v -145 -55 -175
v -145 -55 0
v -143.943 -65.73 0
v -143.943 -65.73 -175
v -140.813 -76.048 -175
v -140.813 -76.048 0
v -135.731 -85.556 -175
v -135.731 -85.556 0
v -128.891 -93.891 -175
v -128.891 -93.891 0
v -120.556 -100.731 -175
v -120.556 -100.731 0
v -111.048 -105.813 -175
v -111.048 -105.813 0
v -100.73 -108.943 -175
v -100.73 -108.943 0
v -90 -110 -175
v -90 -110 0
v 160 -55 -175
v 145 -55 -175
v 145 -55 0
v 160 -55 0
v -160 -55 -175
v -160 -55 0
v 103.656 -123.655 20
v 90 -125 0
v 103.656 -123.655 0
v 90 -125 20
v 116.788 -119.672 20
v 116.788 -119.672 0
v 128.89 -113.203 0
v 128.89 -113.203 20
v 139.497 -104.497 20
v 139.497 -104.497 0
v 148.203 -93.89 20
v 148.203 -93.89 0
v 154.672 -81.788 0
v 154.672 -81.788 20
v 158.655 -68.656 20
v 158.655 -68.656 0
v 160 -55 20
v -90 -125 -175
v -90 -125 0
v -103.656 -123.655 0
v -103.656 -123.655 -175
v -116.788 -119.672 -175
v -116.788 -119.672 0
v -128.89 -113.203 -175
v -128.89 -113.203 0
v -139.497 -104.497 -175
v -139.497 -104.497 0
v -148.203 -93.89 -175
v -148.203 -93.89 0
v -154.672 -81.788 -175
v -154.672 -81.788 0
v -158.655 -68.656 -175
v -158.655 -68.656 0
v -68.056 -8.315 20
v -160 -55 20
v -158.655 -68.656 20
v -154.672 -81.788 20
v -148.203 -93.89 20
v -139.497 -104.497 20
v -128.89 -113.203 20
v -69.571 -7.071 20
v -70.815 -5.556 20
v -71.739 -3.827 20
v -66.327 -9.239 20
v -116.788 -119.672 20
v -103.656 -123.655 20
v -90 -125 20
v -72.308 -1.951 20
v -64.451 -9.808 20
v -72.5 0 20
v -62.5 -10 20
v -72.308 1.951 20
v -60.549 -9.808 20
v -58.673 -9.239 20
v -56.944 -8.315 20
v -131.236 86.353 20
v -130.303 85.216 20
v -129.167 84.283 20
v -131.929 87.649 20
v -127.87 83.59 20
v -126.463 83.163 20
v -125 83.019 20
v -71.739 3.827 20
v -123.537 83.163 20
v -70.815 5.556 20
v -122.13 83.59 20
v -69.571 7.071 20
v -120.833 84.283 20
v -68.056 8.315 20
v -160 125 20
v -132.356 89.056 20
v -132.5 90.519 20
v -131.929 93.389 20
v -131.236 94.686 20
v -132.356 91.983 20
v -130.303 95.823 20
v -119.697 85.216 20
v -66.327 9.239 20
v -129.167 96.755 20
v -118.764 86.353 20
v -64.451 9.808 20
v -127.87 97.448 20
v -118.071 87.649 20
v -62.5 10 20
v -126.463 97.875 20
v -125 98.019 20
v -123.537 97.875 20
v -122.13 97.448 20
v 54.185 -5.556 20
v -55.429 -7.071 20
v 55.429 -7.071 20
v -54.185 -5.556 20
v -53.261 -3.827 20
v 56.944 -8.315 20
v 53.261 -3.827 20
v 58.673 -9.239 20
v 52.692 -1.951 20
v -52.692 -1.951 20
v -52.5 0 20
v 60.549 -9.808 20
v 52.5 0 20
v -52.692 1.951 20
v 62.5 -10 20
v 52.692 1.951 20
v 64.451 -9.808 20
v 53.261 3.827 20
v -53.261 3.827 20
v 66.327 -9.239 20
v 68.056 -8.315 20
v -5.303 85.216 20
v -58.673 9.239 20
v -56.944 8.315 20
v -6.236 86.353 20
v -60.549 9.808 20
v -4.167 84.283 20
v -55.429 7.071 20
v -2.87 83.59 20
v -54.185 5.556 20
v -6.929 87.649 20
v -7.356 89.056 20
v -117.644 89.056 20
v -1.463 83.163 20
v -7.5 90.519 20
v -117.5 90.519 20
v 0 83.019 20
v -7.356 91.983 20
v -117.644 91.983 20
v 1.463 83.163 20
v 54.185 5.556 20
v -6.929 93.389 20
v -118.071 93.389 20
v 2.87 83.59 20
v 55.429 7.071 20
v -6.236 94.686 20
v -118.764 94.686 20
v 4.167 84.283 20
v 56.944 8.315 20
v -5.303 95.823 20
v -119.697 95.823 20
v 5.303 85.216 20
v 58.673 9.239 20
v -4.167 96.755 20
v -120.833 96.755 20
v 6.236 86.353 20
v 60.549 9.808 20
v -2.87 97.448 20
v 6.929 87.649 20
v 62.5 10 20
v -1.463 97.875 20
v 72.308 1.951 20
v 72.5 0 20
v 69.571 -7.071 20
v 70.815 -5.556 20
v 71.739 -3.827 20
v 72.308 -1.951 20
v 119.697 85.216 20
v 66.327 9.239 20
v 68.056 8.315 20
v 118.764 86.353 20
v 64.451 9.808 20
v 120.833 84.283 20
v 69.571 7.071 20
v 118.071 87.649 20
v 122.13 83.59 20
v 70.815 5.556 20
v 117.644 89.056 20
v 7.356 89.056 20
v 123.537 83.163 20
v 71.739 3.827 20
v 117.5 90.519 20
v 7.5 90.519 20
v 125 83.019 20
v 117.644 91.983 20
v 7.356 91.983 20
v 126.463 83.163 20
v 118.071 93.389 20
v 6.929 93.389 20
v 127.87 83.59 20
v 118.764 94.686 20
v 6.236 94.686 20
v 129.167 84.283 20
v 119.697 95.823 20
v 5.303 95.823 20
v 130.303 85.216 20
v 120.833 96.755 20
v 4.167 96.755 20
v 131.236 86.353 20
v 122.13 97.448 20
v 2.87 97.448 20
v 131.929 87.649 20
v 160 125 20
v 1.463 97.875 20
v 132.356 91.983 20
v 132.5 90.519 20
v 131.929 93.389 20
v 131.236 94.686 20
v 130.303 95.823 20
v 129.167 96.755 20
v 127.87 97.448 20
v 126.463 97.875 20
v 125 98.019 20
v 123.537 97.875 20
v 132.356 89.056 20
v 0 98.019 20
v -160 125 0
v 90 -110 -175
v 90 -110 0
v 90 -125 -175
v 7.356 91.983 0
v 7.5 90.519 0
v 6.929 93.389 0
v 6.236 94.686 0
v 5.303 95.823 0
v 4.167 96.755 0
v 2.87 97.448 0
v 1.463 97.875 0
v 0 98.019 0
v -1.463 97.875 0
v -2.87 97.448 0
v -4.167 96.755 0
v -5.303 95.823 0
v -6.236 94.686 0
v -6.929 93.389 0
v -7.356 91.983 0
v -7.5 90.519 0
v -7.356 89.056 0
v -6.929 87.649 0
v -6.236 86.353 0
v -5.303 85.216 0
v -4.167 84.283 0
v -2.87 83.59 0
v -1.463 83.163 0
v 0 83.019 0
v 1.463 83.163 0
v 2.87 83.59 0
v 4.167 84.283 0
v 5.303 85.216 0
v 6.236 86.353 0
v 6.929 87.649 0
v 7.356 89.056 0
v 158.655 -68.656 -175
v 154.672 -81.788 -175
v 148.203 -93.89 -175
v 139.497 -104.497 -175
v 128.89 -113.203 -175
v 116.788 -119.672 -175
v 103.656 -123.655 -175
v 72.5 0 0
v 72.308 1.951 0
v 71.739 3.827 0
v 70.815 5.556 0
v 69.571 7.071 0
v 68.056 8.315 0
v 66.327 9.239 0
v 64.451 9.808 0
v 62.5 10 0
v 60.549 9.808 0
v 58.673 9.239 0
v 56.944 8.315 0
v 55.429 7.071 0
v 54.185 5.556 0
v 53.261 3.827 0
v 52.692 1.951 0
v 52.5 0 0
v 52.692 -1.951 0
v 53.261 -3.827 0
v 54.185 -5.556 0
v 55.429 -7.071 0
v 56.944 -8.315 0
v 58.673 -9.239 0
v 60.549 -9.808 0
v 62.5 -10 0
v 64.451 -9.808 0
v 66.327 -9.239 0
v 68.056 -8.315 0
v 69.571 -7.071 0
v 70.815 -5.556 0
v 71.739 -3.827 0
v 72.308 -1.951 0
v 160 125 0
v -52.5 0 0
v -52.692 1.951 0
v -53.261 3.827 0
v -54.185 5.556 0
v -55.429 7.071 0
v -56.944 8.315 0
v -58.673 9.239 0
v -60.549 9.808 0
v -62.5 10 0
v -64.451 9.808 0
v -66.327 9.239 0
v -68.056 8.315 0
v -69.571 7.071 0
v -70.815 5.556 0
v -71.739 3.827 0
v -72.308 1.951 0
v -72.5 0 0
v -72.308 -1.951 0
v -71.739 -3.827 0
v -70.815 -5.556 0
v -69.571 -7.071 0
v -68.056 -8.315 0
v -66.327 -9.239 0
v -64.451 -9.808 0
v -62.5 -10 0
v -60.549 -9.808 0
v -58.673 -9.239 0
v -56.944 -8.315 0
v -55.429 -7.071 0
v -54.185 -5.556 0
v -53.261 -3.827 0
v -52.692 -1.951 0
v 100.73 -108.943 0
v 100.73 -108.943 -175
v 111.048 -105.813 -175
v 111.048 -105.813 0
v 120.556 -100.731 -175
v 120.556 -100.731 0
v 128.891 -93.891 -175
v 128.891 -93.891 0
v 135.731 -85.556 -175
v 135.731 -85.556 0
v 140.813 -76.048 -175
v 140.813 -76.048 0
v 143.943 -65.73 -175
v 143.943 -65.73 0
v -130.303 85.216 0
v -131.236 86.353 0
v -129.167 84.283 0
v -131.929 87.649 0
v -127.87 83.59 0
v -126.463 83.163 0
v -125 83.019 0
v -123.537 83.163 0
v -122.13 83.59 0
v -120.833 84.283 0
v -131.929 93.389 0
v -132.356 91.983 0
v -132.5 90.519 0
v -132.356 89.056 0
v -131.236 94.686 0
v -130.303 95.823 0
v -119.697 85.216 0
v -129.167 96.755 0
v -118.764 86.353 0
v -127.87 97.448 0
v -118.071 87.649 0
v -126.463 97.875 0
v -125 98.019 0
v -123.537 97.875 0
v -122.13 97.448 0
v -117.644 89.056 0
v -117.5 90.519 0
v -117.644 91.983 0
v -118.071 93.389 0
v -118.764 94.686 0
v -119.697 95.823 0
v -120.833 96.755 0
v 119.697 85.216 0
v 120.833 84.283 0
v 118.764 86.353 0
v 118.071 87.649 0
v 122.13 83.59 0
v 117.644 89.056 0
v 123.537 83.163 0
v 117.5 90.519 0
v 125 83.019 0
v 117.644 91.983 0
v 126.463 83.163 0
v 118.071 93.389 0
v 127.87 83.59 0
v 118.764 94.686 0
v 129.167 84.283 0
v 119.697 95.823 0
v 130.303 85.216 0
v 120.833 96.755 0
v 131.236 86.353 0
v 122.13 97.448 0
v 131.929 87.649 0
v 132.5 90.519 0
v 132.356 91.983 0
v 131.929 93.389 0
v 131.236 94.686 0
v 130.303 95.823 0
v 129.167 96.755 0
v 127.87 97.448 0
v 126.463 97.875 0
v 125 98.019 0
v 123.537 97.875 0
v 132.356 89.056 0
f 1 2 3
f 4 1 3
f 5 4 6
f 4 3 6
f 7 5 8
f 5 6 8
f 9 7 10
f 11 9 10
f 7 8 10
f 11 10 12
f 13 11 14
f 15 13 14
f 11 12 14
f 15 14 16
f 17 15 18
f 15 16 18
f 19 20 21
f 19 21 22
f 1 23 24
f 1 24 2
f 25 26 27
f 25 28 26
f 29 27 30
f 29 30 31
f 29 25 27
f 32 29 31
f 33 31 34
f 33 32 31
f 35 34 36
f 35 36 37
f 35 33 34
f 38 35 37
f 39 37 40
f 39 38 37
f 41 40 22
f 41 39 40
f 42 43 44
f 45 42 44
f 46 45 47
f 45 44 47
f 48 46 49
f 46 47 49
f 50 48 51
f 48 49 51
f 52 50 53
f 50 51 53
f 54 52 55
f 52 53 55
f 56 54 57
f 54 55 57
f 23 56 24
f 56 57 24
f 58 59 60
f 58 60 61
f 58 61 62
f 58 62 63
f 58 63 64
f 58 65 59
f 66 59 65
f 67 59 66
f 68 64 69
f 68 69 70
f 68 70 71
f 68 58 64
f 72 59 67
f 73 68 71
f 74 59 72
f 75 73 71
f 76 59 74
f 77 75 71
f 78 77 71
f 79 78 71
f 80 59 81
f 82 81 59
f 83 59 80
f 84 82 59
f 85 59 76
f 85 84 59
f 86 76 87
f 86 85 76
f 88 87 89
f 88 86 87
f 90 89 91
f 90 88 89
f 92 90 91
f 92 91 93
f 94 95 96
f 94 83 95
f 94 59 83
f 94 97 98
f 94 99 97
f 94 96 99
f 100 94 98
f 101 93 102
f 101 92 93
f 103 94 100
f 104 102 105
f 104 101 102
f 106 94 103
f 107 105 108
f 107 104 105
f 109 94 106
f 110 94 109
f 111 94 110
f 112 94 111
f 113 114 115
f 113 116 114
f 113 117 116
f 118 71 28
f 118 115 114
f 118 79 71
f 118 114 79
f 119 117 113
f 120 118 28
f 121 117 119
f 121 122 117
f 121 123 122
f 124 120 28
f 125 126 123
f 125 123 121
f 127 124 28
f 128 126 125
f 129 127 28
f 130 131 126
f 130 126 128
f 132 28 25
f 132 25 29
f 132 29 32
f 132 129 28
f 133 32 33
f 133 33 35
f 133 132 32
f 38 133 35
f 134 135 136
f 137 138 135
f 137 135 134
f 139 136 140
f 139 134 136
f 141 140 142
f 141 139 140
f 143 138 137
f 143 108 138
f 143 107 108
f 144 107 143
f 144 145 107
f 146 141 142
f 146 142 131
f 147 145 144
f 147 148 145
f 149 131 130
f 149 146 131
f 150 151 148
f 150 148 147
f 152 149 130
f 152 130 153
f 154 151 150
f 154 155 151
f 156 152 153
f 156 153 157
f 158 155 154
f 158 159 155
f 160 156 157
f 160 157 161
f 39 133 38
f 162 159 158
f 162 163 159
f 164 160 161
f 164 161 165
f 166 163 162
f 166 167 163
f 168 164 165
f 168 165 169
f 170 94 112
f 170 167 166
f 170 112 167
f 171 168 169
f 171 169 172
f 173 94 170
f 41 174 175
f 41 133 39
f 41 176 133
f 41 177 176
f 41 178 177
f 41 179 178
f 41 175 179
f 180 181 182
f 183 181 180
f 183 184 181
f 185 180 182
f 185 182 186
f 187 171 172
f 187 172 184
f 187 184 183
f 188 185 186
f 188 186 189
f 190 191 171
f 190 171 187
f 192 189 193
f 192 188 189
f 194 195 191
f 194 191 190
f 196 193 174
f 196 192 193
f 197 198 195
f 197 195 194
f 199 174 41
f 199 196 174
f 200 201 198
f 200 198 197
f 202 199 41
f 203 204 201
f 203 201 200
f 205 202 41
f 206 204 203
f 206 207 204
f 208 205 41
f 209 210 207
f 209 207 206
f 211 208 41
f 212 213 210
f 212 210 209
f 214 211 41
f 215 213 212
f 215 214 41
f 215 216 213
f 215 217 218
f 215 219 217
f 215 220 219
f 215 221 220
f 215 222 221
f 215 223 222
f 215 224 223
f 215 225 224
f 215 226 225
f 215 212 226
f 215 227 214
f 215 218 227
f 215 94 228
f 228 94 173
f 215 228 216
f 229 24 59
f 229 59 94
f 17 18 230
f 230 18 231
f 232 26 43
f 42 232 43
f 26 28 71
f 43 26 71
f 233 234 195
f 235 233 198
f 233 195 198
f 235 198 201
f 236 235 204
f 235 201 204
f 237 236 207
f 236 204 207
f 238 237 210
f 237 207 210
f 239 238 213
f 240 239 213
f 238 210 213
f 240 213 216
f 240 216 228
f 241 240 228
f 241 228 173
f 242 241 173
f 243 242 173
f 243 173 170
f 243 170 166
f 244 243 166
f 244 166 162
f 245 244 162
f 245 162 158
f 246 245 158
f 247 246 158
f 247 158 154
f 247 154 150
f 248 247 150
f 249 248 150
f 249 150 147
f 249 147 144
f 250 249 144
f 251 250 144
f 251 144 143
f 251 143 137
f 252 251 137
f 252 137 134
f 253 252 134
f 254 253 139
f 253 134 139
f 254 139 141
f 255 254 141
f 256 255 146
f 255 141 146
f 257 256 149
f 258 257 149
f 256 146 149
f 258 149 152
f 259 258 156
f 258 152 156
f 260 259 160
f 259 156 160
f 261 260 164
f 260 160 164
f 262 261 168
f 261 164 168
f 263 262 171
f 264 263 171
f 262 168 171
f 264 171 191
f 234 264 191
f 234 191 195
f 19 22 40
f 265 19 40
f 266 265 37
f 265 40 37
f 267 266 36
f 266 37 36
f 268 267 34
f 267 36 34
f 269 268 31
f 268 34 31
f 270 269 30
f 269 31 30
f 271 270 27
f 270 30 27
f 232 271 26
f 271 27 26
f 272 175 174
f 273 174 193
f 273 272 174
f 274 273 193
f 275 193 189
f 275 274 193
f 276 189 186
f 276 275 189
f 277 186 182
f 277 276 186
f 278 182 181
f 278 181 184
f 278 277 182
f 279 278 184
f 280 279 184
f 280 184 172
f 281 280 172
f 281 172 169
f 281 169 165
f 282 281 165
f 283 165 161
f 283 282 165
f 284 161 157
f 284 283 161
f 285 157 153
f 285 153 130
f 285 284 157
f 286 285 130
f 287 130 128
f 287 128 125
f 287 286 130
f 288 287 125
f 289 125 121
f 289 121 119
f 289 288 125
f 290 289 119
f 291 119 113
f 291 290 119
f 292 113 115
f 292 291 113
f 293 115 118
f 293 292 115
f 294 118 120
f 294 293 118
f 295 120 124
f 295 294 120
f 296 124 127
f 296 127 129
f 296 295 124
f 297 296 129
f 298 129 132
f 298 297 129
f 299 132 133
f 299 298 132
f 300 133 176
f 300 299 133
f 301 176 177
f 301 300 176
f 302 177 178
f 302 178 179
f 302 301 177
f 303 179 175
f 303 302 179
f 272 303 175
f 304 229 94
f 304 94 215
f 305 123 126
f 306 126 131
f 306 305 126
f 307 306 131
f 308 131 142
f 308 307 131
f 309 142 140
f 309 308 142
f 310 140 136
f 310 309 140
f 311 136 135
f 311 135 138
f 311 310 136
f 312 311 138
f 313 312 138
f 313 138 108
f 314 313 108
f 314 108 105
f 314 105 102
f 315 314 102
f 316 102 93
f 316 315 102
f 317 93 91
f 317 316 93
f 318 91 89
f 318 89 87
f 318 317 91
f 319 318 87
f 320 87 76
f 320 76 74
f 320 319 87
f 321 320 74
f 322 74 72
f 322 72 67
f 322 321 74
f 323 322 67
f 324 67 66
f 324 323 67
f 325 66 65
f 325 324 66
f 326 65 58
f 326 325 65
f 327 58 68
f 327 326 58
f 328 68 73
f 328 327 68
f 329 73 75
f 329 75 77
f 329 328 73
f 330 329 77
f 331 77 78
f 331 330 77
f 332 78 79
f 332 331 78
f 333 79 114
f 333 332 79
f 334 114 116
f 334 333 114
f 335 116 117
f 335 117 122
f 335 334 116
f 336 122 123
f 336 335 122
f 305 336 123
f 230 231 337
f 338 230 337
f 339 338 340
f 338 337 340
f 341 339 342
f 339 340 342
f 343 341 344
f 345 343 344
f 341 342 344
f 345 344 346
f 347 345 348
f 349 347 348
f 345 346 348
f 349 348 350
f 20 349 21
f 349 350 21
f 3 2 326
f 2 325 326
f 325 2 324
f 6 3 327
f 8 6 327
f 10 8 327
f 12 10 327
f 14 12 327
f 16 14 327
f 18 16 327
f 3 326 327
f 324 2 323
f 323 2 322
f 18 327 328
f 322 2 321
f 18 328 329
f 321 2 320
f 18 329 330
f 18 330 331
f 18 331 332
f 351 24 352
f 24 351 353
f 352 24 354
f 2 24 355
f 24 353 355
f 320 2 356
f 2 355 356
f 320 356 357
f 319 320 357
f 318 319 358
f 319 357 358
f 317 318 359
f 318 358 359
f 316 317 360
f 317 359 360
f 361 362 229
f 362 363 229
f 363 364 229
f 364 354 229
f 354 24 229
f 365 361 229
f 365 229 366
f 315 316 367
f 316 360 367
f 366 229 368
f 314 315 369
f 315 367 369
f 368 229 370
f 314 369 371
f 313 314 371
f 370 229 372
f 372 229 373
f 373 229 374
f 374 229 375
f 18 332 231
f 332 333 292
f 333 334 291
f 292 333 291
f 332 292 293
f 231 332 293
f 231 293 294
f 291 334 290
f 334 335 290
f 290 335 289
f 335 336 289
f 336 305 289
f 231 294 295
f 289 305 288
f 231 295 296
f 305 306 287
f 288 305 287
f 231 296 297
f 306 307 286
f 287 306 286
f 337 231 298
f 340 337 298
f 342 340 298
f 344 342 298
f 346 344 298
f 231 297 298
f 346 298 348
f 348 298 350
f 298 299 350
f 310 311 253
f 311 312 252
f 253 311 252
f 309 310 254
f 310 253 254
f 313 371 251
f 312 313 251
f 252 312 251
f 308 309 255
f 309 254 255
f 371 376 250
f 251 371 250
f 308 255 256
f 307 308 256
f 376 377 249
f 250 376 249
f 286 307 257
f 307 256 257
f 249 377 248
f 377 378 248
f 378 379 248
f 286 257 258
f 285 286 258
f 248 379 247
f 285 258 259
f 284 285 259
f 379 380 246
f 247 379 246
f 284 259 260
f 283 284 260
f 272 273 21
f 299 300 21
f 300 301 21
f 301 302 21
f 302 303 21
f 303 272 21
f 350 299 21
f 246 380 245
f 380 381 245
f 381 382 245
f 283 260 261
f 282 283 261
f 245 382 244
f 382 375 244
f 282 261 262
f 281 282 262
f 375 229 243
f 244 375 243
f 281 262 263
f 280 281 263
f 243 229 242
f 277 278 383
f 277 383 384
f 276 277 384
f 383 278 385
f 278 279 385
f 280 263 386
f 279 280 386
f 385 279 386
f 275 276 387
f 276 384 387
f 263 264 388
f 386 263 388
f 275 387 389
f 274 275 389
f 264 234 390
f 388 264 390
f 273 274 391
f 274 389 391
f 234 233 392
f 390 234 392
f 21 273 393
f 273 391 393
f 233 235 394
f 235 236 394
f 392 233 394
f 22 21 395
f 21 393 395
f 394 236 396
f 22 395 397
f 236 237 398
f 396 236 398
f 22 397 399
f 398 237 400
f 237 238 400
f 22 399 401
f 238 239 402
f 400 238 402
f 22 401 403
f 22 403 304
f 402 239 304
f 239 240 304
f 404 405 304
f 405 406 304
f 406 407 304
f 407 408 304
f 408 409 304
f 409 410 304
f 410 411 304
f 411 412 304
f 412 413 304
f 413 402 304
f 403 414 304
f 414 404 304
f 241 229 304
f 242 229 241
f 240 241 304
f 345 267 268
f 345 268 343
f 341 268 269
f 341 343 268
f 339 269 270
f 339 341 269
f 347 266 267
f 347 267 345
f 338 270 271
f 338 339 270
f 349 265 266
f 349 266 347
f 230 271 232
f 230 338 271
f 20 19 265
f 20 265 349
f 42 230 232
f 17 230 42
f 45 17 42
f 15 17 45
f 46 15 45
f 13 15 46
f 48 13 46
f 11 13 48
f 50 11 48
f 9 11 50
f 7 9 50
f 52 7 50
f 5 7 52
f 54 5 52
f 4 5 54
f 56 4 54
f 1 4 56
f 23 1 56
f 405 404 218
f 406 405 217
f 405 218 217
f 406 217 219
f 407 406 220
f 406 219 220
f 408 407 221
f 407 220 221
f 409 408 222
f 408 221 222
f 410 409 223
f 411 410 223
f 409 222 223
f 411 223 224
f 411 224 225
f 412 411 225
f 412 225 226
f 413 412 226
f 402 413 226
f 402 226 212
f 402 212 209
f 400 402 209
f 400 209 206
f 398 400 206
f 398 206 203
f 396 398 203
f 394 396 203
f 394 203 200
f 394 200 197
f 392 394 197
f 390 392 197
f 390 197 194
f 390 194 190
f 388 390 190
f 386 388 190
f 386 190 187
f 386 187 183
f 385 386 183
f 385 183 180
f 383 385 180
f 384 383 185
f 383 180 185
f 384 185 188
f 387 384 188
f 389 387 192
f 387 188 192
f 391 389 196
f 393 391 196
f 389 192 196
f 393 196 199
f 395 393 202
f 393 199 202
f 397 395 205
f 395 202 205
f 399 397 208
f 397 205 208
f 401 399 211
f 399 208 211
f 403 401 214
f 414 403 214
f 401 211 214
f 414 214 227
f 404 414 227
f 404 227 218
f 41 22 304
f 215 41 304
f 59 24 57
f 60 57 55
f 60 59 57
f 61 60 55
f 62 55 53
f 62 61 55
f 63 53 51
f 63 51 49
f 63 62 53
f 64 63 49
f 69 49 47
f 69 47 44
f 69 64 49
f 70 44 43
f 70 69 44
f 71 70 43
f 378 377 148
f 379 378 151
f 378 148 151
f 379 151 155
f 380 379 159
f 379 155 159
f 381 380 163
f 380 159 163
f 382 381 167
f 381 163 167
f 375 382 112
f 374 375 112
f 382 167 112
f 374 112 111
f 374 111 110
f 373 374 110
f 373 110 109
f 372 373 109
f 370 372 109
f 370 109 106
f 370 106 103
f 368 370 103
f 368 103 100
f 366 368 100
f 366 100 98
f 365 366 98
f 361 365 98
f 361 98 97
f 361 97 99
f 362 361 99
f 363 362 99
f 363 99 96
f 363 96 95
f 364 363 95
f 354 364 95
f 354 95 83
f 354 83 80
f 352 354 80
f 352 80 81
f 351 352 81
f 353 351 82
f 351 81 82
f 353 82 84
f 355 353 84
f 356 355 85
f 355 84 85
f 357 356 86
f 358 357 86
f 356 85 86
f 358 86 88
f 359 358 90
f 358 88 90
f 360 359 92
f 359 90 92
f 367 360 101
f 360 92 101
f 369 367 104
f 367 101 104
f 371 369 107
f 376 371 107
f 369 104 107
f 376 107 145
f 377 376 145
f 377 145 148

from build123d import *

# Parameters (mm, degrees)
SKETCH1_W           = 320
SKETCH1_H           = 250
SKETCH1_R           = 10
BOSS_EXTRUDE1_DEPTH = 20
SKETCH2_R           = 7.5
CUT_EXTRUDE1_DEPTH  = 205.022057631
FILLET1_R           = 70
BOSS_EXTRUDE2_DEPTH = 175


# Read off the part's stored shape, not the designer's step: Boss-Extrude2
with BuildPart() as part:
    # Sketch1 → Boss-Extrude1 (new body)
    with BuildSketch(Plane.XY):
        Rectangle(SKETCH1_W, SKETCH1_H)
        with Locations((62.5, 0)):
            Circle(SKETCH1_R, mode=Mode.SUBTRACT)
        with Locations((-62.5, 0)):
            Circle(SKETCH1_R, mode=Mode.SUBTRACT)
    extrude(amount=BOSS_EXTRUDE1_DEPTH)

    # Sketch2 → Cut-Extrude1 (cut, through all)
    with BuildSketch(Plane.XY.offset(20)):
        with Locations((0, 90.519334951)):
            Circle(SKETCH2_R)
        with Locations((-125, 90.519334951)):
            Circle(SKETCH2_R)
        with Locations((125, 90.519334951)):
            Circle(SKETCH2_R)
    extrude(amount=-CUT_EXTRUDE1_DEPTH, mode=Mode.SUBTRACT)

    # Fillet1
    fillet1_edges = [part.edges().sort_by_distance(p)[0] for p in [
        (160, -125, 10),
        (-160, -125, 10),
    ]]
    fillet(fillet1_edges, radius=FILLET1_R)

    # Boss-Extrude2 outline → Boss-Extrude2 (add)
    with BuildSketch(Plane(origin=(0, 0, 0), x_dir=(-1, 0, 0), z_dir=(0, 0, -1))):
        with BuildLine():
            Line((-90, -125), (90, -125))
            ThreePointArc((90, -125), (139.497474683, -104.497474683), (160, -55))
            Line((160, -55), (145, -55))
            ThreePointArc((145, -55), (128.890872965, -93.890872965), (90, -110))
            Line((90, -110), (-90, -110))
            ThreePointArc((-90, -110), (-128.890872965, -93.890872965), (-145, -55))
            Line((-145, -55), (-160, -55))
            ThreePointArc((-160, -55), (-139.497474683, -104.497474683), (-90, -125))
        make_face()
    extrude(amount=BOSS_EXTRUDE2_DEPTH)


solid = part.part
